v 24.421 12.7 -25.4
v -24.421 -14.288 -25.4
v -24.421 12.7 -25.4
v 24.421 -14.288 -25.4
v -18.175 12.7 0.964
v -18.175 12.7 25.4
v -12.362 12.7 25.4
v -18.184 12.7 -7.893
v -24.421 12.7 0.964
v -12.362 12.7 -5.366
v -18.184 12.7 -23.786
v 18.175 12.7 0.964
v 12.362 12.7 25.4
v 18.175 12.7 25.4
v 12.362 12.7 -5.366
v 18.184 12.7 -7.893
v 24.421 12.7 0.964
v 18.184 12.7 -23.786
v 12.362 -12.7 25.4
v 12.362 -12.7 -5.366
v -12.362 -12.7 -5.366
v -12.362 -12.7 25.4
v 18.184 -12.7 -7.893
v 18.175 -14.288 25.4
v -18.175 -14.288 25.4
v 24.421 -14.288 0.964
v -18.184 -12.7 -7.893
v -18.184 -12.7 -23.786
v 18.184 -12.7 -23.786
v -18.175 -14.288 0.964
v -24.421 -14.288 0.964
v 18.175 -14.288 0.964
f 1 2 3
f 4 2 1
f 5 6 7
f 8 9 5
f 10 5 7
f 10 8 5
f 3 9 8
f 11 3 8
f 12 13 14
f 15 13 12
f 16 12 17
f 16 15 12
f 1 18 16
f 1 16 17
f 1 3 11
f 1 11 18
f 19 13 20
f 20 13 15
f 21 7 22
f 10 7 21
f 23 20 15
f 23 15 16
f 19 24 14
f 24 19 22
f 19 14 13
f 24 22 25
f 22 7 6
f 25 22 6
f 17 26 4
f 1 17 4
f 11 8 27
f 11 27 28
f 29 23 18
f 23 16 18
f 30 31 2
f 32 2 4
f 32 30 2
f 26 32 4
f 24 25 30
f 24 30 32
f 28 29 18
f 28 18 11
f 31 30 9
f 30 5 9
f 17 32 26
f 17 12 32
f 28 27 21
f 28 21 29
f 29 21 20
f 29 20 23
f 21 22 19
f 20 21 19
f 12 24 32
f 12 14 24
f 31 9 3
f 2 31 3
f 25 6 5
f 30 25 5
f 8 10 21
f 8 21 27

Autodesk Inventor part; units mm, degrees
ref_plane "YZ Plane" through (0, 0, 0) normal (1, 0, 0) x (0, 1, 0)
ref_plane "XZ Plane" through (0, 0, 0) normal (0, 1, 0) x (-1, 0, 0)
ref_plane "XY Plane" through (0, 0, 0) normal (0, 0, 1) x (1, 0, 0)
sketch "Sketch1" plane through (0, 0, 0) normal (0, 1, 0) x (-1, 0, 0)
  line L0 (0, 0) -> (0, -14.0125) construction
  line L1 (12.3617, 25.4) -> (12.3617, -5.3655)
  line L2 (12.3617, -5.3655) -> (18.1749, -5.3655)
  line L3 (18.1844, -7.8927) -> (18.1844, -25.4)
  line L4 (18.1749, 25.4) -> (18.1749, 0.9638)
  line L5 (18.1749, 0.9638) -> (24.4214, 0.9638)
  line L6 (24.4214, 0.9638) -> (24.4214, -25.4)
  line L7 (18.1749, 25.4) -> (12.3617, 25.4)
  line L8 (18.1844, -25.4) -> (24.4214, -25.4)
  line L9 (-12.3617, 25.4) -> (-12.3617, -5.3655)
  line L10 (-12.3617, -5.3655) -> (-18.1749, 9.6342)
  line L11 (-18.1844, -7.8927) -> (-18.1844, -25.4)
  line L12 (-18.1749, 25.4) -> (-18.1749, 0.9638)
  line L13 (-18.1749, 0.9638) -> (-24.4214, 0.9638)
  line L14 (-24.4214, 0.9638) -> (-24.4214, -25.4)
  line L15 (-18.1749, 25.4) -> (-12.3617, 25.4)
  line L16 (-18.1844, -25.4) -> (-24.4214, -25.4)
  line L17 (12.3617, -5.3655) -> (18.1844, -7.8927)
  line L18 (-12.3617, -5.3655) -> (-18.1844, -7.8927)
  line L19 (12.3617, -5.3655) -> (0, 0) construction
  line L20 (27.1198, 0) -> (23.5153, 0) construction
  point P0 (18.1938, 0)
  point P1 (-18.1938, 0)
  point P2 (25.3175, 0)
  dimension "d10" = 50.8
  dimension "d11" = 25.4
extrude "Extrusion1" add sketch "Sketch1" against normal mid plane 25.4
sketch "Sketch2" plane through (0, -12.7, 0) normal (0, -1, 0) x (1, 0, 0)
  line L0 (-12.3617, -5.3655) -> (-12.3617, 25.4) projected
  line L1 (-12.3617, 25.4) -> (-18.1749, 25.4) projected
  line L2 (-18.1749, 25.4) -> (-18.1749, 0.9638) projected
  line L3 (-18.1749, 0.9638) -> (-24.4214, 0.9638) projected
  line L4 (-24.4214, 0.9638) -> (-24.4214, -25.4) projected
  line L5 (-24.4214, -25.4) -> (-18.1844, -25.4) projected
  line L6 (-18.1844, -25.4) -> (-18.1844, -7.8927) projected
  line L7 (24.4214, 0.9638) -> (18.1749, 0.9638) projected
  line L8 (18.1749, 0.9638) -> (18.1749, 25.4) projected
  line L9 (18.1749, 25.4) -> (12.3617, 25.4) projected
  line L10 (12.3617, 25.4) -> (12.3617, -5.3655) projected
  line L11 (18.1844, -7.8927) -> (18.1844, -25.4) projected
  line L12 (18.1844, -25.4) -> (24.4214, -25.4) projected
  line L13 (24.4214, -25.4) -> (24.4214, 0.9638) projected
  line L14 (18.1749, 25.4) -> (12.3617, 25.4) projected
  line L15 (-12.3617, 25.4) -> (-18.1749, 25.4) projected
  line L16 (18.1749, 25.4) -> (-18.1749, 25.4)
  line L17 (24.4214, 0.9638) -> (24.4214, -25.4) projected
  line L18 (24.4214, -25.4) -> (-24.4214, -25.4)
  line L19 (12.3617, -5.3655) -> (18.1844, -7.8927) projected
  line L20 (-18.1844, -7.8927) -> (-12.3617, -5.3655) projected
  point P0 (0, 0)
extrude "Extrusion2" add sketch "Sketch2" along normal blind 1.5875
sketch "Sketch4" plane through (0, -12.7, 0) normal (0, 1, 0) x (1, 0, 0)
  line L0 (18.1844, 7.8927) -> (18.1844, 25.4) projected
  line L1 (-18.1844, 25.4) -> (18.1844, 25.4) projected
  line L2 (-18.1844, 25.4) -> (-18.1844, 7.8927) projected
  line L3 (-18.1844, 7.8927) -> (-12.3617, 5.3655) projected
  line L4 (-12.3617, 5.3655) -> (-12.3617, -25.4) projected
  line L5 (12.3617, -25.4) -> (-12.3617, -25.4) projected
  line L6 (12.3617, -25.4) -> (12.3617, 5.3655) projected
  line L7 (12.3617, 5.3655) -> (18.1844, 7.8927) projected
  line L8 (-18.1844, 25.4) -> (18.1844, 25.4)
  line L9 (18.1844, 25.4) -> (18.1844, 23.7858)
  line L10 (18.1844, 23.7858) -> (-18.1844, 23.7858)
  line L11 (-18.1844, 23.7858) -> (-18.1844, 25.4)
  point P0 (0, 0)
extrude "Extrusion4" add sketch "Sketch4" along normal up to surface (25.4 mm away) contours L10 L2 L1 L0
properties part number "large_room1"
